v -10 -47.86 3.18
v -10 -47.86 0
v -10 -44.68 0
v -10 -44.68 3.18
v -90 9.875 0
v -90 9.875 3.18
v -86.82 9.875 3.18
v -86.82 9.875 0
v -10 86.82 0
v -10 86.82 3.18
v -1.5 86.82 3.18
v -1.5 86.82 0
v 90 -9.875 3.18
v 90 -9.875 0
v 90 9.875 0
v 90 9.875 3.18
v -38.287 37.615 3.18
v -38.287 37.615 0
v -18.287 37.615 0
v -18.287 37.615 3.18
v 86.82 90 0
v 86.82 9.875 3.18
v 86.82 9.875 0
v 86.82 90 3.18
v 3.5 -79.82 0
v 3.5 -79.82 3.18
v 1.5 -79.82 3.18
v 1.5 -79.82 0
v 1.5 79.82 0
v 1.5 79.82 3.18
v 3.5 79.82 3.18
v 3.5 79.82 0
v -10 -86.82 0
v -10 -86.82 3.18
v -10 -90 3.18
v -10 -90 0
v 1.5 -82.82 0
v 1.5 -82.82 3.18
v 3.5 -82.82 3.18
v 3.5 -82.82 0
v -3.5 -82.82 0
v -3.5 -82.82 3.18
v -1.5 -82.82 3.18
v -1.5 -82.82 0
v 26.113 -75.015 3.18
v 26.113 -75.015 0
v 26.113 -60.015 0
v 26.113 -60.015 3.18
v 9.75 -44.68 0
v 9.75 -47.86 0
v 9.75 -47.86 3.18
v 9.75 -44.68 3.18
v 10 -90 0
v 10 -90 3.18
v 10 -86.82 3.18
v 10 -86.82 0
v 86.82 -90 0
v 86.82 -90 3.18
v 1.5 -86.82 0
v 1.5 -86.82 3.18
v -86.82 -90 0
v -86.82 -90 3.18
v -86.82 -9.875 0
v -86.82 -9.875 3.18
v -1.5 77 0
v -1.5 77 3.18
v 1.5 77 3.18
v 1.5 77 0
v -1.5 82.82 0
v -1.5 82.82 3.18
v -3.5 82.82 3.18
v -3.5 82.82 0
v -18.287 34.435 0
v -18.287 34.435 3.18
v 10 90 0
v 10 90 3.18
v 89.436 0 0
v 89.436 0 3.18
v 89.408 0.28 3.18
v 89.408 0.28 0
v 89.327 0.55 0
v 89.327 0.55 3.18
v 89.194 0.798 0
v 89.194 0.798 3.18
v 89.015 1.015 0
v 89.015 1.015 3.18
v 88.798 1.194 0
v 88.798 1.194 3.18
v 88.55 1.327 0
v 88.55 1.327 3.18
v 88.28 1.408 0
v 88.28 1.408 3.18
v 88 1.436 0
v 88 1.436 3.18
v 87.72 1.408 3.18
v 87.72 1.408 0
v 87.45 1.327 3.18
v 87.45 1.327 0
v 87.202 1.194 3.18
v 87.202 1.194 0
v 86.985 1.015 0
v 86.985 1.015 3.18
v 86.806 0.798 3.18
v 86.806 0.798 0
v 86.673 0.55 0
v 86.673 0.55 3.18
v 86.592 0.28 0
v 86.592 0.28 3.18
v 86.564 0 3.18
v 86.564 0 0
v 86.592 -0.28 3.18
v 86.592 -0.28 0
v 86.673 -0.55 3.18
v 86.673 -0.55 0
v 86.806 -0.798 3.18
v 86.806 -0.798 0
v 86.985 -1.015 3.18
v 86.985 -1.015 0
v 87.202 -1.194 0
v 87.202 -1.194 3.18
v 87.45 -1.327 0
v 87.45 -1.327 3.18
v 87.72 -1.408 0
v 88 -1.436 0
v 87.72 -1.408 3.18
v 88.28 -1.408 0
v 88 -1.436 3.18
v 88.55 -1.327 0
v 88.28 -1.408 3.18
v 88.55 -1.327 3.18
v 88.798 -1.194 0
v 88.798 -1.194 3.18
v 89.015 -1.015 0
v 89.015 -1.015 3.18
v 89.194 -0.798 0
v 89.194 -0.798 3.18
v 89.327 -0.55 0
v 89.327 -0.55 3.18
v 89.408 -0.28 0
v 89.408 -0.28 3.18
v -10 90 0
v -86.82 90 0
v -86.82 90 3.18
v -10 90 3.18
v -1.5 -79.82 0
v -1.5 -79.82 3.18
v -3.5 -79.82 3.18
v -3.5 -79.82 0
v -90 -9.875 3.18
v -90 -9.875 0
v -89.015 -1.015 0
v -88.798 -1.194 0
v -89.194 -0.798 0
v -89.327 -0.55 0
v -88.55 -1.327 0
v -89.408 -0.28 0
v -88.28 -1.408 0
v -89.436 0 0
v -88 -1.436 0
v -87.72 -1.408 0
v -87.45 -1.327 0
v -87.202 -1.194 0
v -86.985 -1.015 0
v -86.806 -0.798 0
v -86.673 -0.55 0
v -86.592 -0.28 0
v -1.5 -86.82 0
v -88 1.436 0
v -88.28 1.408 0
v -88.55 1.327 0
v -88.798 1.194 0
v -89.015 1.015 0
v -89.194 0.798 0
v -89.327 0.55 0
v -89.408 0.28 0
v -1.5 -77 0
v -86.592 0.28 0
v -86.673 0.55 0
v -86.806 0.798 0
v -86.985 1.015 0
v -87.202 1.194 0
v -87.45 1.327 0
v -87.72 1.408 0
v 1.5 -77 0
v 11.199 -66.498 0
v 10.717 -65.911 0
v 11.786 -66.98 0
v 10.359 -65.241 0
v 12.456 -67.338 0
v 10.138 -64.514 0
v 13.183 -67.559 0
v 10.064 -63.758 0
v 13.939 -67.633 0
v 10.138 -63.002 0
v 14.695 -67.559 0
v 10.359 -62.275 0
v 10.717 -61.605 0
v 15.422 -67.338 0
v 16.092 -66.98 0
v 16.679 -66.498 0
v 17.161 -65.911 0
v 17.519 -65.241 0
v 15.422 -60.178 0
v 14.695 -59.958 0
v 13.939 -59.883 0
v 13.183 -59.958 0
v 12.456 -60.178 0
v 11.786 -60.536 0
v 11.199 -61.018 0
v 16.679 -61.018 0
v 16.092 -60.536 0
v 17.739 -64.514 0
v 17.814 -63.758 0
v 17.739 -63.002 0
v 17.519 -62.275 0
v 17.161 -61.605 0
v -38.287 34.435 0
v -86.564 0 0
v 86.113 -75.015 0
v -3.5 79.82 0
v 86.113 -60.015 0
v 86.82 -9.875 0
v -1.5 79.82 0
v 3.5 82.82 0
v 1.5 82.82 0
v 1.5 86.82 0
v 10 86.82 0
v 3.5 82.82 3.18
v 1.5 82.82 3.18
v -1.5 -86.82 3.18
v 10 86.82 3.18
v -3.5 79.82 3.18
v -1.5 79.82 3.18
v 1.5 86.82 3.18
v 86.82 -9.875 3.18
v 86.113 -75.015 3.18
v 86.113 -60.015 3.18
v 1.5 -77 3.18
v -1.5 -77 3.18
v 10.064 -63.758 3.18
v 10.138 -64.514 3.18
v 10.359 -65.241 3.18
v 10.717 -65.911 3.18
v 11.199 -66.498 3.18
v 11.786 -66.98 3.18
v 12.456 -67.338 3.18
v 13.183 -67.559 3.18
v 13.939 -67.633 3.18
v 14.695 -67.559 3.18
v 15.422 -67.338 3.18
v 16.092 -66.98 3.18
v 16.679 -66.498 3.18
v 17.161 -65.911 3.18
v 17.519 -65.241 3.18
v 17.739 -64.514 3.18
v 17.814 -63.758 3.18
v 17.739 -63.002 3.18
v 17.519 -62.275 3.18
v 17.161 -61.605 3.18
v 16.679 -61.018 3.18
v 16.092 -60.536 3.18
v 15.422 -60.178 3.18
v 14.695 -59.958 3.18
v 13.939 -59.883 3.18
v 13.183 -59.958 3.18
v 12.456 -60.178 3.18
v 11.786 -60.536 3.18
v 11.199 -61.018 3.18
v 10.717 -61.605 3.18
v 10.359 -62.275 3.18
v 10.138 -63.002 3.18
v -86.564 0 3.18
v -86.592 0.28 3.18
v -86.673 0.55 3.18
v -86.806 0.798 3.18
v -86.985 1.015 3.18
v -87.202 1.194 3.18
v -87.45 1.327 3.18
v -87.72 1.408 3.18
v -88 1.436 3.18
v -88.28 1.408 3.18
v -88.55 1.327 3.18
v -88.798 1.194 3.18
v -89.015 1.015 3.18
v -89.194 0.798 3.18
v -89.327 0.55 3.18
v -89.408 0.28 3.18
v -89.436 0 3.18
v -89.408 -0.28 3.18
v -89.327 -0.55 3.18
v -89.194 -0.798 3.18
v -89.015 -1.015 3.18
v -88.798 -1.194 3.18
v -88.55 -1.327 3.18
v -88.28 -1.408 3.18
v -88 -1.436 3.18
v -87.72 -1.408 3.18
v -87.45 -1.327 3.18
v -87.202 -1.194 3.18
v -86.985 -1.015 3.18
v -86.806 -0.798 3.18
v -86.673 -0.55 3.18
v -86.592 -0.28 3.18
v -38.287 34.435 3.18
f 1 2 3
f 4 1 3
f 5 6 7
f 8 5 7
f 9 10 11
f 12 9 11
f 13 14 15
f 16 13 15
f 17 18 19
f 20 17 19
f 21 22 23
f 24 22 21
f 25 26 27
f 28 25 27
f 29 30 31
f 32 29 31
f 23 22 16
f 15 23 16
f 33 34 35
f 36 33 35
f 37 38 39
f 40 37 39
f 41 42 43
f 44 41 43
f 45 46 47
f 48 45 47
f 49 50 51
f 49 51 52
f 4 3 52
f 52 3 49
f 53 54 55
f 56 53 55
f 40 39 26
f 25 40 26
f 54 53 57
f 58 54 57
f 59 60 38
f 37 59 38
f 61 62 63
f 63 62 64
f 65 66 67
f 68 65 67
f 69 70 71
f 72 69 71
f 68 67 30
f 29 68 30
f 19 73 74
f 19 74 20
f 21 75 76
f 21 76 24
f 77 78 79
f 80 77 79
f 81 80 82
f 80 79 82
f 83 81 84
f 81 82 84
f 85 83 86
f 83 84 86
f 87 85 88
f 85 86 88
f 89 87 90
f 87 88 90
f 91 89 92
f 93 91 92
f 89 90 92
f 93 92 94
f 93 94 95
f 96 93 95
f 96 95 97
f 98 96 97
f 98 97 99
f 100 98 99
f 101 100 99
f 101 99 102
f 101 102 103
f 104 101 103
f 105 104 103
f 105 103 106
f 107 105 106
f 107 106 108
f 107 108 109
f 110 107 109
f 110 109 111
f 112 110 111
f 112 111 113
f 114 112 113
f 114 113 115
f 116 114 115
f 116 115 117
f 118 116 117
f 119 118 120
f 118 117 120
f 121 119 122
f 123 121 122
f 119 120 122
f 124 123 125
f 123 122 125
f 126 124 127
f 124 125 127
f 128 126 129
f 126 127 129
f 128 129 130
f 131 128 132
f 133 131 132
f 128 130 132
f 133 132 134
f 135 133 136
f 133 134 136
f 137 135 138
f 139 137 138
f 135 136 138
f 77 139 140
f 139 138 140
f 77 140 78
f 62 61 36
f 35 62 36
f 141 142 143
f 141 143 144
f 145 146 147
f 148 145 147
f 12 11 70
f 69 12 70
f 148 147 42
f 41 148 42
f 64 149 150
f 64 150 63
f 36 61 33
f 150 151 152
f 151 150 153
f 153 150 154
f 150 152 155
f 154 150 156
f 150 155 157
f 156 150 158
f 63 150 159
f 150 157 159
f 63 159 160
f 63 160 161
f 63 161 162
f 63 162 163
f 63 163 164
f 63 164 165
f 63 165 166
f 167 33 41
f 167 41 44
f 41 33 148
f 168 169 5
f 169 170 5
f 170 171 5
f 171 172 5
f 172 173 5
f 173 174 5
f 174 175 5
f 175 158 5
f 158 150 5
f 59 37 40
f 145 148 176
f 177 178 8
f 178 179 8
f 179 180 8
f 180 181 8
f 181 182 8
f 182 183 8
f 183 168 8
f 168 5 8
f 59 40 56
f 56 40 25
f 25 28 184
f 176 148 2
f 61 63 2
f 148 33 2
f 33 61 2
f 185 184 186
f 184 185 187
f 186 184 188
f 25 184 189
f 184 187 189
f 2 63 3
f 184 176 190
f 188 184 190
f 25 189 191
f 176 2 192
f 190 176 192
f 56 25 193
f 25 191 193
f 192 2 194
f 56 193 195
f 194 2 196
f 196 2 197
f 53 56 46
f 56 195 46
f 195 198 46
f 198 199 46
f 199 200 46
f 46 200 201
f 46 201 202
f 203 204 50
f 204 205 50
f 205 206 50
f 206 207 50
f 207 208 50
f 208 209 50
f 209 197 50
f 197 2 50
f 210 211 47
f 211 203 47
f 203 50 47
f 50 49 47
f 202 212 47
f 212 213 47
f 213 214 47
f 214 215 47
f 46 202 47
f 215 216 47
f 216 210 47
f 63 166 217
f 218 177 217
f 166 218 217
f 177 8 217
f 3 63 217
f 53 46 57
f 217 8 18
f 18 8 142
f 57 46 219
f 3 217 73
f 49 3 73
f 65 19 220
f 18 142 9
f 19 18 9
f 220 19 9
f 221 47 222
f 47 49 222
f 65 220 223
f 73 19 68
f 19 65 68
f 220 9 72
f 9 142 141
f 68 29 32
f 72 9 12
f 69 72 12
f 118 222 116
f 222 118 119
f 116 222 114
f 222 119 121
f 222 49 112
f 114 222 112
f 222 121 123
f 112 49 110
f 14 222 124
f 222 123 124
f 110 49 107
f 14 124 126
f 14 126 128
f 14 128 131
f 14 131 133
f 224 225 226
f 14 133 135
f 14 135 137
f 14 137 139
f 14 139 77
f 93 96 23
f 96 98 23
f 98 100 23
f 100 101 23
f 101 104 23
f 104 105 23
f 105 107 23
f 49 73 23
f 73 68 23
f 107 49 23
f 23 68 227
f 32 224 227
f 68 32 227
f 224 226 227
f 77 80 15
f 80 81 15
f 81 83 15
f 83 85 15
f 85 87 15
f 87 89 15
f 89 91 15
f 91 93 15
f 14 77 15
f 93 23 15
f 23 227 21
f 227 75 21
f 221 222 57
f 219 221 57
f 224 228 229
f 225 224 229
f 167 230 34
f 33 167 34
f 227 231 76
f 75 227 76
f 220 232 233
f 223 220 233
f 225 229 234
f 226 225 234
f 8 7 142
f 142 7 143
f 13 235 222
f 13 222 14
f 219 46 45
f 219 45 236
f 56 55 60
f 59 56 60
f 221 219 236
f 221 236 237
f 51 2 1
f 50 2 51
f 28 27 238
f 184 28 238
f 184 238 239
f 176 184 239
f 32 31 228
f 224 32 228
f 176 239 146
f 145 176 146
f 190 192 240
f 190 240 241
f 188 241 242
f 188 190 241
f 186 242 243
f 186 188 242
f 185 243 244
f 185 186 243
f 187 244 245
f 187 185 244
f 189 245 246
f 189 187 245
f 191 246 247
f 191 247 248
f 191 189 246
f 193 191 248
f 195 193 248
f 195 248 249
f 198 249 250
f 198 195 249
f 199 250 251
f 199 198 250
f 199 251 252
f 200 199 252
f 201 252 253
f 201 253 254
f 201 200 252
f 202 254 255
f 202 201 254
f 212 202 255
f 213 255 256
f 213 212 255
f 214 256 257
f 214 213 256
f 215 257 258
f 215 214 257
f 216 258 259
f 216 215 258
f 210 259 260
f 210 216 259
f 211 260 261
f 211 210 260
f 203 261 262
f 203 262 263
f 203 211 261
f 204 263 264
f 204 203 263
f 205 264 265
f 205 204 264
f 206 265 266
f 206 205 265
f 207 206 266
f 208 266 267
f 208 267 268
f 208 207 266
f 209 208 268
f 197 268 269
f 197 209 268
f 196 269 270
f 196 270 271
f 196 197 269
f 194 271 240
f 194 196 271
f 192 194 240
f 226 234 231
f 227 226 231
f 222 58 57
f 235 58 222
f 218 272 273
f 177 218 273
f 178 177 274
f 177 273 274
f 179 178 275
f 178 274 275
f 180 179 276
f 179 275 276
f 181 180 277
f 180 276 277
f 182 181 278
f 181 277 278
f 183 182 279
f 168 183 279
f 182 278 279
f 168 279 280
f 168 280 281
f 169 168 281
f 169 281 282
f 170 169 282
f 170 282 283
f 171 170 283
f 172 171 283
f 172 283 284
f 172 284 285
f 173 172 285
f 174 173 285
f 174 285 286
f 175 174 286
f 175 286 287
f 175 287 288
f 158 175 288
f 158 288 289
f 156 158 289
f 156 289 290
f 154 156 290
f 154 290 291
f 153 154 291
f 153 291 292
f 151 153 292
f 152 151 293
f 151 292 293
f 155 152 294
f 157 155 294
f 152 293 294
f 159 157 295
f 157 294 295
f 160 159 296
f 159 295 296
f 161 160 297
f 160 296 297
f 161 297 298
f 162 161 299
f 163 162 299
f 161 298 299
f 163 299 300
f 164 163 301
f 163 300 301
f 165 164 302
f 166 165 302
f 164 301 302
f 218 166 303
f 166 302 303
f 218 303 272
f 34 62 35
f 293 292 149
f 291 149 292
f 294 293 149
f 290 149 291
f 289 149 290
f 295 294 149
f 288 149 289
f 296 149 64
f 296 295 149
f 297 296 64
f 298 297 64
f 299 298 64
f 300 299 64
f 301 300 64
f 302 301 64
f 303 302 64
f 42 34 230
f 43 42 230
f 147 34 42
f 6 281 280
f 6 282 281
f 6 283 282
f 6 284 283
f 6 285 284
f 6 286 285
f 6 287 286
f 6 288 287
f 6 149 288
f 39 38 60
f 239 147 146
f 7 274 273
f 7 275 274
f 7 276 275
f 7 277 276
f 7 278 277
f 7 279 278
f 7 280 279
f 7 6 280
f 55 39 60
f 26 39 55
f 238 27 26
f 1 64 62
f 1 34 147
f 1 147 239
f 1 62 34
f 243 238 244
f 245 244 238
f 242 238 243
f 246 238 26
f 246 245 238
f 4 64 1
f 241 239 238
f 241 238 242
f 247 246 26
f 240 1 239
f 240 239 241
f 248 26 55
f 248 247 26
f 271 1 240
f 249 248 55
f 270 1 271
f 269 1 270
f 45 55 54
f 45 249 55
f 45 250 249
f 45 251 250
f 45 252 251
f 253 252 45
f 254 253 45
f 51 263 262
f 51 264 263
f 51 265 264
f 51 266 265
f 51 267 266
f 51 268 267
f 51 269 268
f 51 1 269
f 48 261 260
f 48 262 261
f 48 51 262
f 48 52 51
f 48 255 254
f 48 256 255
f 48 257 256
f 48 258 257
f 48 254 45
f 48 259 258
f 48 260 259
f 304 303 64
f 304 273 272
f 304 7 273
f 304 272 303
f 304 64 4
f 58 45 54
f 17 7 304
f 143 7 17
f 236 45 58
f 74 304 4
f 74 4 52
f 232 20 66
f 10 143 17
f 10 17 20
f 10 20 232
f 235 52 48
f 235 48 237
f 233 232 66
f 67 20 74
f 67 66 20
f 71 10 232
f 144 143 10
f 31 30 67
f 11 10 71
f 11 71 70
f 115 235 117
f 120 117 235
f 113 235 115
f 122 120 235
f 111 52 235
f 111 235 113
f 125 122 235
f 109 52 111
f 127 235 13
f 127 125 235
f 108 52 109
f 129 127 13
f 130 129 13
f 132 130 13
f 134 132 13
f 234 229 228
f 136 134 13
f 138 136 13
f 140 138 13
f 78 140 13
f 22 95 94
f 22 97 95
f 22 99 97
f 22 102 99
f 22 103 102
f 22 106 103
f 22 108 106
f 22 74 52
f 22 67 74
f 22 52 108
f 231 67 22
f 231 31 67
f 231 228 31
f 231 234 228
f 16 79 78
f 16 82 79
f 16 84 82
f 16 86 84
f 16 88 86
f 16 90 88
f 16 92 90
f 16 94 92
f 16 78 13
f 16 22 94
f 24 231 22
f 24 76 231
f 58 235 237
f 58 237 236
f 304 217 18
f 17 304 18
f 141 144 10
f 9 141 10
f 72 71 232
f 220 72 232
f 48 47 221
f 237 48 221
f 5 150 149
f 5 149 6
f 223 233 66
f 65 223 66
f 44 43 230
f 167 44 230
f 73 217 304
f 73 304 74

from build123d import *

# Parameters (mm, degrees)
SKETCH3_W           = 180
SKETCH3_H           = 180
SKETCH3_R           = 3.875
SKETCH3_W_2         = 20
SKETCH3_H_2         = 3.18
SKETCH3_W_3         = 19.75
SKETCH3_W_4         = 60
SKETCH3_H_3         = 15
BOSS_EXTRUDE1_DEPTH = 3.18
CUT_EXTRUDE1_DEPTH  = 128.318939675
SKETCH5_R           = 1.436023081
SKETCH5_W           = 3.18
SKETCH5_H           = 80.125
CUT_EXTRUDE2_DEPTH  = 128.318939675


with BuildPart() as part:
    # Sketch3 → Boss-Extrude1 (new body)
    with BuildSketch(Plane.XY):
        Rectangle(SKETCH3_W, SKETCH3_H)
        with Locations(Location((13.938719016, -63.758151241, 0), (0, 0, 180))):
            Circle(SKETCH3_R, mode=Mode.SUBTRACT)
        with Locations((-28.286899392, 36.024803222)):
            Rectangle(SKETCH3_W_2, SKETCH3_H_2, mode=Mode.SUBTRACT)
        with Locations((-0.125, -46.269729843)):
            Rectangle(SKETCH3_W_3, SKETCH3_H_2, mode=Mode.SUBTRACT)
        with Locations((56.112903479, -67.514680034)):
            Rectangle(SKETCH3_W_4, SKETCH3_H_3, mode=Mode.SUBTRACT)
    extrude(amount=BOSS_EXTRUDE1_DEPTH)

    # Sketch4 → Cut-Extrude1 (cut, through all)
    with BuildSketch(Plane.XY.offset(3.18)):
        Polygon((1.5, 86.82), (10, 86.82), (10, 90), (-10, 90), (-10, 86.82), (-1.5, 86.82), (-1.5, 82.82), (-3.5, 82.82), (-3.5, 79.82), (-1.5, 79.82), (-1.5, 77), (1.5, 77), (1.5, 79.82), (3.5, 79.82), (3.5, 82.82), (1.5, 82.82), align=None)
        Polygon((1.5, -79.82), (1.5, -77), (-1.5, -77), (-1.5, -79.82), (-3.5, -79.82), (-3.5, -82.82), (-1.5, -82.82), (-1.5, -86.82), (-10, -86.82), (-10, -90), (10, -90), (10, -86.82), (1.5, -86.82), (1.5, -82.82), (3.5, -82.82), (3.5, -79.82), align=None)
    extrude(amount=-CUT_EXTRUDE1_DEPTH, mode=Mode.SUBTRACT)

    # Sketch5 → Cut-Extrude2 (cut, through all)
    with BuildSketch(Plane.XY.offset(3.18)):
        with Locations((-88, 0)):
            Circle(SKETCH5_R)
        with Locations((88, 0)):
            Circle(SKETCH5_R)
        with Locations((-88.41, 49.9375)):
            Rectangle(SKETCH5_W, SKETCH5_H)
        with Locations((-88.41, -49.9375)):
            Rectangle(SKETCH5_W, SKETCH5_H)
        with Locations((88.41, -49.9375)):
            Rectangle(SKETCH5_W, SKETCH5_H)
        with Locations((88.41, 49.9375)):
            Rectangle(SKETCH5_W, SKETCH5_H)
    extrude(amount=-CUT_EXTRUDE2_DEPTH, mode=Mode.SUBTRACT)


solid = part.part
